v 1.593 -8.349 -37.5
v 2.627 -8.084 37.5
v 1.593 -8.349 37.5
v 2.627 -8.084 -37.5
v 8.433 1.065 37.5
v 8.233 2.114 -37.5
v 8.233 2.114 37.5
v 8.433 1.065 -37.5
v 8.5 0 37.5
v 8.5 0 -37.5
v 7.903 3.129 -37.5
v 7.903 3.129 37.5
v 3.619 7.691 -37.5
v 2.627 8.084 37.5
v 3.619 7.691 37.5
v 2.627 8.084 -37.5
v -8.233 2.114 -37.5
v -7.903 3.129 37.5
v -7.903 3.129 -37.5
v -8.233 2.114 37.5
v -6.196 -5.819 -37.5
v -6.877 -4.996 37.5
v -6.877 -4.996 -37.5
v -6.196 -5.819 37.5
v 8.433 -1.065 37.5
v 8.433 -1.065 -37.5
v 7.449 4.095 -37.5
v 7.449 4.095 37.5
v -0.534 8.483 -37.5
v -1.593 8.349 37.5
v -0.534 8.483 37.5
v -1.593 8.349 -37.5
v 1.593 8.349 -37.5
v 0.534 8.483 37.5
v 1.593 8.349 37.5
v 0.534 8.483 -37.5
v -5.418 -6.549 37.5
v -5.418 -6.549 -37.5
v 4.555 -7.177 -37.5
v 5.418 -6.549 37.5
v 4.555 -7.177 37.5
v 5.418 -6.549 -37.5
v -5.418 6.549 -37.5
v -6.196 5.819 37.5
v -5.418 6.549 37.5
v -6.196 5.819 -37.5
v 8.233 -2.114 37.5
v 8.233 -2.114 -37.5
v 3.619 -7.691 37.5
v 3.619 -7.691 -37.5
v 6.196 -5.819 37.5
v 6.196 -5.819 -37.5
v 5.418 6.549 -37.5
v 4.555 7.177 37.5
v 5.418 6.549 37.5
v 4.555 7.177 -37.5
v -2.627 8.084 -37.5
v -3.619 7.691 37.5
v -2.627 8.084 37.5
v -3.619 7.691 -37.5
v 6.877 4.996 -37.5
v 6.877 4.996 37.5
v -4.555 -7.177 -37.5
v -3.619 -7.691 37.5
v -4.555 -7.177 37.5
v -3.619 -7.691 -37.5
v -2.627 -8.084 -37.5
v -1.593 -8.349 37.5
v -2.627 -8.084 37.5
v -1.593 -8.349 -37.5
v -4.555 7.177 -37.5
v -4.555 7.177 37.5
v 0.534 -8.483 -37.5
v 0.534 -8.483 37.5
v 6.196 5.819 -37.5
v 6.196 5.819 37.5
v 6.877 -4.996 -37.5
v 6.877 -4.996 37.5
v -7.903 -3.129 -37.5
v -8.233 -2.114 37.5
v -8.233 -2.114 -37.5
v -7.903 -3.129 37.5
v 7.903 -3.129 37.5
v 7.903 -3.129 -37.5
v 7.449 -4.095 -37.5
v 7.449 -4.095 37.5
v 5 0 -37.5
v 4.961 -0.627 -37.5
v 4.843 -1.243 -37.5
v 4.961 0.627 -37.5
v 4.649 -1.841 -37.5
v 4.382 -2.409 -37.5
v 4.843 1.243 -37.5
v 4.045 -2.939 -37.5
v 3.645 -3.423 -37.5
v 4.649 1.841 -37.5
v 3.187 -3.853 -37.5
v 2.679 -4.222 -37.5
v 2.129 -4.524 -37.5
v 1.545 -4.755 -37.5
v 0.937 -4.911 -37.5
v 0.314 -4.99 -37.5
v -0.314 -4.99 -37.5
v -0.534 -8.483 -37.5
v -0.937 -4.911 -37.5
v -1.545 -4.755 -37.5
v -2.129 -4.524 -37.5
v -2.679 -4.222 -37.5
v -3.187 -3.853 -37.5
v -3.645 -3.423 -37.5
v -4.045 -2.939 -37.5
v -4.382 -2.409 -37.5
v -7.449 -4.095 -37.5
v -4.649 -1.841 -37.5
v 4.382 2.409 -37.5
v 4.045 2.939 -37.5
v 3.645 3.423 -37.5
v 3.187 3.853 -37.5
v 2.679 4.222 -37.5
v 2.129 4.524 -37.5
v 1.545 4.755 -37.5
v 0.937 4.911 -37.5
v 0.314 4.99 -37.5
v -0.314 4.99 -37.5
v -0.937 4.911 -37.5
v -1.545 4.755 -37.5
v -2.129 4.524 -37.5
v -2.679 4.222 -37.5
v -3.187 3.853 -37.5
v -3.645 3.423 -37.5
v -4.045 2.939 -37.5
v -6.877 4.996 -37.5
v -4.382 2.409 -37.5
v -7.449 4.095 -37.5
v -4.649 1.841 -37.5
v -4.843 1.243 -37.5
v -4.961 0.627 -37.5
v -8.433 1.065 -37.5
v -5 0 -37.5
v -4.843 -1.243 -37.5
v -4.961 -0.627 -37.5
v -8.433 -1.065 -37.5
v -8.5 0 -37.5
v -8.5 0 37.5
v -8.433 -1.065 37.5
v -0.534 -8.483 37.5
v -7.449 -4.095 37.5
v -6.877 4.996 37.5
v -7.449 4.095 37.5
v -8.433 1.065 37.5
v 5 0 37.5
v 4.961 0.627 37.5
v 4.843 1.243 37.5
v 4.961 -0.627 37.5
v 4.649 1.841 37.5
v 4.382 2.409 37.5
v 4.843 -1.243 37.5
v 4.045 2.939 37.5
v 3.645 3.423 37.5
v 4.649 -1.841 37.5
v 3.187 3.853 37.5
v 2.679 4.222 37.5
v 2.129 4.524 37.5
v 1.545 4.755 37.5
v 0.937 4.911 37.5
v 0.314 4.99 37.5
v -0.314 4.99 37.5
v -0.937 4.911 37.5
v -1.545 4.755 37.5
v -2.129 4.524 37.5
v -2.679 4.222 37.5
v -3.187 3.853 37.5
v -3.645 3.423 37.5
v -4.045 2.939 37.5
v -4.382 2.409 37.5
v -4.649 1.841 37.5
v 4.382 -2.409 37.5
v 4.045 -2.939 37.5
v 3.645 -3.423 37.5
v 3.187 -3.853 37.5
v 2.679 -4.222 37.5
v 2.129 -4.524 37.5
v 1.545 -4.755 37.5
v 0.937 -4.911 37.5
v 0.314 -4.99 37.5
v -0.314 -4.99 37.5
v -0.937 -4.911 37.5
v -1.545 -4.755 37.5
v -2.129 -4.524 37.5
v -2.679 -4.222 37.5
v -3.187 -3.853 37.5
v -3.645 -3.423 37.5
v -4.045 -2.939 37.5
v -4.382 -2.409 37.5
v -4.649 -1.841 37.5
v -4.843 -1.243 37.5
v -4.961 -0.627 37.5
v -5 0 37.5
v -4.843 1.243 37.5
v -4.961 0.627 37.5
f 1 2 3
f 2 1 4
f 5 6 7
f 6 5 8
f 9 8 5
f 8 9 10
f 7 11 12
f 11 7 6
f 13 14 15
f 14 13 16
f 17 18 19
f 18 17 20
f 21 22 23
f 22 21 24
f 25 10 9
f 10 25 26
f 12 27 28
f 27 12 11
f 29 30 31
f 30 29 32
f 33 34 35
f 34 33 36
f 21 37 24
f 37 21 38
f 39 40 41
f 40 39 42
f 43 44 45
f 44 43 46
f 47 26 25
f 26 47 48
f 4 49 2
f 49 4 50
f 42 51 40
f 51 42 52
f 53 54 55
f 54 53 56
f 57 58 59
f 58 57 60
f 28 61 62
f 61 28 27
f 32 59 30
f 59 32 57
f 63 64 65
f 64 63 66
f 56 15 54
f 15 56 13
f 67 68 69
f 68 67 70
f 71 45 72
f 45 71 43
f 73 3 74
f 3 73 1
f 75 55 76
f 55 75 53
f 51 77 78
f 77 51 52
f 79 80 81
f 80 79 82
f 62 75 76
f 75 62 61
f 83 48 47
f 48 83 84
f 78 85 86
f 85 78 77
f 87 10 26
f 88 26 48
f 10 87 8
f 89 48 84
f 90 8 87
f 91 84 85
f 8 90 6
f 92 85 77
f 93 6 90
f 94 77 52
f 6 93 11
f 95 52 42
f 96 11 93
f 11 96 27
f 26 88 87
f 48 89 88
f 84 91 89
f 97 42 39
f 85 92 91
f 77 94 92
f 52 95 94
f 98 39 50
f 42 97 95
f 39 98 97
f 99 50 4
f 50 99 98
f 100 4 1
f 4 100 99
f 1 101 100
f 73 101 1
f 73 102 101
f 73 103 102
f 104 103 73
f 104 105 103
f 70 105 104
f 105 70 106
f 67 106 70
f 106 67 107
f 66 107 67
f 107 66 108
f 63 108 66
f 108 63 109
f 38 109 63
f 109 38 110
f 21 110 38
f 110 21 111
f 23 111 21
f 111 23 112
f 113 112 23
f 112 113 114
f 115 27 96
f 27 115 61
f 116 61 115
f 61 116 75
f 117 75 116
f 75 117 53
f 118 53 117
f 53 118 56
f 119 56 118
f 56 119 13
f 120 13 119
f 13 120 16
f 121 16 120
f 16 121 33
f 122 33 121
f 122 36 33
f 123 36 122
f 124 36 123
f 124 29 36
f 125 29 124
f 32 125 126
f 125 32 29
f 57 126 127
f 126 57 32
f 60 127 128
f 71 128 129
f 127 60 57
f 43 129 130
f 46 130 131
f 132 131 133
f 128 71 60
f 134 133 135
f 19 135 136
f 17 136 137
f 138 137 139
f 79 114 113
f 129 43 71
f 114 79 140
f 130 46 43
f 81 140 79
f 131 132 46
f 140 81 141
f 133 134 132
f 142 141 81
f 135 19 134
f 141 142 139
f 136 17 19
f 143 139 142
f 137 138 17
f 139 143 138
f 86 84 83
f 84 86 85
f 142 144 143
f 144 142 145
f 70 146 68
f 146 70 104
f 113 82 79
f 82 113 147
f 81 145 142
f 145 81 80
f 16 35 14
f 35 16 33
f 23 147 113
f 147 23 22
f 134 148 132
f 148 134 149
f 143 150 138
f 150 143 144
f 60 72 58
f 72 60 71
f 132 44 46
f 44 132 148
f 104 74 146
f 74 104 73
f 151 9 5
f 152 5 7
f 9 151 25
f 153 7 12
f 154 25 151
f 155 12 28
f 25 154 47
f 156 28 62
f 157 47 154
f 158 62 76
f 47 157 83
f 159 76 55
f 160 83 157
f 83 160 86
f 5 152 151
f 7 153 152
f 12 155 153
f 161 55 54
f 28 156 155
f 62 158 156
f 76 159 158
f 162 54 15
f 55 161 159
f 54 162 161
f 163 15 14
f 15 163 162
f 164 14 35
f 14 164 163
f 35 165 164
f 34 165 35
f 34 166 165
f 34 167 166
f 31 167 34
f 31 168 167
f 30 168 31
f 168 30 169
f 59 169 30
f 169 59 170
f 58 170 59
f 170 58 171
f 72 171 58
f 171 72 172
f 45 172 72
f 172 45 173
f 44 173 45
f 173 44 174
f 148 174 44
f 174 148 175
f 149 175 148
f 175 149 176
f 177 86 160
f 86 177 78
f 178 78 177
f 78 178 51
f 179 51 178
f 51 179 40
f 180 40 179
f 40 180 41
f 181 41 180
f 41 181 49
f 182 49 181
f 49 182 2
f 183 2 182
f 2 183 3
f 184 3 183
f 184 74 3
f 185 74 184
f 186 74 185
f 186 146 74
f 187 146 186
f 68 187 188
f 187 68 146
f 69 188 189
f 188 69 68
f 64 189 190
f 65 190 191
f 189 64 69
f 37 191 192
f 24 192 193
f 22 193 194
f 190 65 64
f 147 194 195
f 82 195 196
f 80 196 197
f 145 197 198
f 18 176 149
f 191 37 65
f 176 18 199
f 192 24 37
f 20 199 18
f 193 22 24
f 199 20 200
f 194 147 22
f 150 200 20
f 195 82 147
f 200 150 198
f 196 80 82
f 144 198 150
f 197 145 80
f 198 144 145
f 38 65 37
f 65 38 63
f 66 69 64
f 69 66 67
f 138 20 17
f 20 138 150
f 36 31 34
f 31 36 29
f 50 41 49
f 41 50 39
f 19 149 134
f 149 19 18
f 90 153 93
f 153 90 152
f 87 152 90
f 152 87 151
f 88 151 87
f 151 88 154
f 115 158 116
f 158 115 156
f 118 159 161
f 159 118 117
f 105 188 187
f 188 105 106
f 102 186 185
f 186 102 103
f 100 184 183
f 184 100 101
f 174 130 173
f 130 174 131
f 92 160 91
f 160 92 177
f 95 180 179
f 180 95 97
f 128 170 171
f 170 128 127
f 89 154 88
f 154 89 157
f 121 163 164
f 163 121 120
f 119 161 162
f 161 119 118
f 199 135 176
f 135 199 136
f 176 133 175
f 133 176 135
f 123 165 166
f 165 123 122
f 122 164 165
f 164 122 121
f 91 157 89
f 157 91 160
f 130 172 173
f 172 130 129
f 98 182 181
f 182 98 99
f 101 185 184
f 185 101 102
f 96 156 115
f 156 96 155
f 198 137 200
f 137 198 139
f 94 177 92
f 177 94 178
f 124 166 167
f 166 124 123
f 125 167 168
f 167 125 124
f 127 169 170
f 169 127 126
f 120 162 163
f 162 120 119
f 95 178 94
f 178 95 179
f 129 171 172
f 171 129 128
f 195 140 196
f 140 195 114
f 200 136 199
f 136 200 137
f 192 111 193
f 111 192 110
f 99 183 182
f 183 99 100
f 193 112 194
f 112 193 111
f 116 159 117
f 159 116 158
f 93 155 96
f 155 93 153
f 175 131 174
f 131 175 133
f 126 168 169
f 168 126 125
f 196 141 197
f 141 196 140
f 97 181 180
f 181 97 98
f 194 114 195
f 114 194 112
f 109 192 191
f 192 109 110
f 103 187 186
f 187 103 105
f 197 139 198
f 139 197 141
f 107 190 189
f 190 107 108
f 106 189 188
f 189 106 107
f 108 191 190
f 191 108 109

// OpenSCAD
$fn = 50;


difference() {
	union() {
		translate(v = [0, 0, -37.5000000000]) {
			cylinder(h = 75, r = 8.5000000000);
		}
	}
	union() {
		translate(v = [0, 0, -100.0000000000]) {
			cylinder(h = 200, r = 5.0000000000);
		}
	}
}
